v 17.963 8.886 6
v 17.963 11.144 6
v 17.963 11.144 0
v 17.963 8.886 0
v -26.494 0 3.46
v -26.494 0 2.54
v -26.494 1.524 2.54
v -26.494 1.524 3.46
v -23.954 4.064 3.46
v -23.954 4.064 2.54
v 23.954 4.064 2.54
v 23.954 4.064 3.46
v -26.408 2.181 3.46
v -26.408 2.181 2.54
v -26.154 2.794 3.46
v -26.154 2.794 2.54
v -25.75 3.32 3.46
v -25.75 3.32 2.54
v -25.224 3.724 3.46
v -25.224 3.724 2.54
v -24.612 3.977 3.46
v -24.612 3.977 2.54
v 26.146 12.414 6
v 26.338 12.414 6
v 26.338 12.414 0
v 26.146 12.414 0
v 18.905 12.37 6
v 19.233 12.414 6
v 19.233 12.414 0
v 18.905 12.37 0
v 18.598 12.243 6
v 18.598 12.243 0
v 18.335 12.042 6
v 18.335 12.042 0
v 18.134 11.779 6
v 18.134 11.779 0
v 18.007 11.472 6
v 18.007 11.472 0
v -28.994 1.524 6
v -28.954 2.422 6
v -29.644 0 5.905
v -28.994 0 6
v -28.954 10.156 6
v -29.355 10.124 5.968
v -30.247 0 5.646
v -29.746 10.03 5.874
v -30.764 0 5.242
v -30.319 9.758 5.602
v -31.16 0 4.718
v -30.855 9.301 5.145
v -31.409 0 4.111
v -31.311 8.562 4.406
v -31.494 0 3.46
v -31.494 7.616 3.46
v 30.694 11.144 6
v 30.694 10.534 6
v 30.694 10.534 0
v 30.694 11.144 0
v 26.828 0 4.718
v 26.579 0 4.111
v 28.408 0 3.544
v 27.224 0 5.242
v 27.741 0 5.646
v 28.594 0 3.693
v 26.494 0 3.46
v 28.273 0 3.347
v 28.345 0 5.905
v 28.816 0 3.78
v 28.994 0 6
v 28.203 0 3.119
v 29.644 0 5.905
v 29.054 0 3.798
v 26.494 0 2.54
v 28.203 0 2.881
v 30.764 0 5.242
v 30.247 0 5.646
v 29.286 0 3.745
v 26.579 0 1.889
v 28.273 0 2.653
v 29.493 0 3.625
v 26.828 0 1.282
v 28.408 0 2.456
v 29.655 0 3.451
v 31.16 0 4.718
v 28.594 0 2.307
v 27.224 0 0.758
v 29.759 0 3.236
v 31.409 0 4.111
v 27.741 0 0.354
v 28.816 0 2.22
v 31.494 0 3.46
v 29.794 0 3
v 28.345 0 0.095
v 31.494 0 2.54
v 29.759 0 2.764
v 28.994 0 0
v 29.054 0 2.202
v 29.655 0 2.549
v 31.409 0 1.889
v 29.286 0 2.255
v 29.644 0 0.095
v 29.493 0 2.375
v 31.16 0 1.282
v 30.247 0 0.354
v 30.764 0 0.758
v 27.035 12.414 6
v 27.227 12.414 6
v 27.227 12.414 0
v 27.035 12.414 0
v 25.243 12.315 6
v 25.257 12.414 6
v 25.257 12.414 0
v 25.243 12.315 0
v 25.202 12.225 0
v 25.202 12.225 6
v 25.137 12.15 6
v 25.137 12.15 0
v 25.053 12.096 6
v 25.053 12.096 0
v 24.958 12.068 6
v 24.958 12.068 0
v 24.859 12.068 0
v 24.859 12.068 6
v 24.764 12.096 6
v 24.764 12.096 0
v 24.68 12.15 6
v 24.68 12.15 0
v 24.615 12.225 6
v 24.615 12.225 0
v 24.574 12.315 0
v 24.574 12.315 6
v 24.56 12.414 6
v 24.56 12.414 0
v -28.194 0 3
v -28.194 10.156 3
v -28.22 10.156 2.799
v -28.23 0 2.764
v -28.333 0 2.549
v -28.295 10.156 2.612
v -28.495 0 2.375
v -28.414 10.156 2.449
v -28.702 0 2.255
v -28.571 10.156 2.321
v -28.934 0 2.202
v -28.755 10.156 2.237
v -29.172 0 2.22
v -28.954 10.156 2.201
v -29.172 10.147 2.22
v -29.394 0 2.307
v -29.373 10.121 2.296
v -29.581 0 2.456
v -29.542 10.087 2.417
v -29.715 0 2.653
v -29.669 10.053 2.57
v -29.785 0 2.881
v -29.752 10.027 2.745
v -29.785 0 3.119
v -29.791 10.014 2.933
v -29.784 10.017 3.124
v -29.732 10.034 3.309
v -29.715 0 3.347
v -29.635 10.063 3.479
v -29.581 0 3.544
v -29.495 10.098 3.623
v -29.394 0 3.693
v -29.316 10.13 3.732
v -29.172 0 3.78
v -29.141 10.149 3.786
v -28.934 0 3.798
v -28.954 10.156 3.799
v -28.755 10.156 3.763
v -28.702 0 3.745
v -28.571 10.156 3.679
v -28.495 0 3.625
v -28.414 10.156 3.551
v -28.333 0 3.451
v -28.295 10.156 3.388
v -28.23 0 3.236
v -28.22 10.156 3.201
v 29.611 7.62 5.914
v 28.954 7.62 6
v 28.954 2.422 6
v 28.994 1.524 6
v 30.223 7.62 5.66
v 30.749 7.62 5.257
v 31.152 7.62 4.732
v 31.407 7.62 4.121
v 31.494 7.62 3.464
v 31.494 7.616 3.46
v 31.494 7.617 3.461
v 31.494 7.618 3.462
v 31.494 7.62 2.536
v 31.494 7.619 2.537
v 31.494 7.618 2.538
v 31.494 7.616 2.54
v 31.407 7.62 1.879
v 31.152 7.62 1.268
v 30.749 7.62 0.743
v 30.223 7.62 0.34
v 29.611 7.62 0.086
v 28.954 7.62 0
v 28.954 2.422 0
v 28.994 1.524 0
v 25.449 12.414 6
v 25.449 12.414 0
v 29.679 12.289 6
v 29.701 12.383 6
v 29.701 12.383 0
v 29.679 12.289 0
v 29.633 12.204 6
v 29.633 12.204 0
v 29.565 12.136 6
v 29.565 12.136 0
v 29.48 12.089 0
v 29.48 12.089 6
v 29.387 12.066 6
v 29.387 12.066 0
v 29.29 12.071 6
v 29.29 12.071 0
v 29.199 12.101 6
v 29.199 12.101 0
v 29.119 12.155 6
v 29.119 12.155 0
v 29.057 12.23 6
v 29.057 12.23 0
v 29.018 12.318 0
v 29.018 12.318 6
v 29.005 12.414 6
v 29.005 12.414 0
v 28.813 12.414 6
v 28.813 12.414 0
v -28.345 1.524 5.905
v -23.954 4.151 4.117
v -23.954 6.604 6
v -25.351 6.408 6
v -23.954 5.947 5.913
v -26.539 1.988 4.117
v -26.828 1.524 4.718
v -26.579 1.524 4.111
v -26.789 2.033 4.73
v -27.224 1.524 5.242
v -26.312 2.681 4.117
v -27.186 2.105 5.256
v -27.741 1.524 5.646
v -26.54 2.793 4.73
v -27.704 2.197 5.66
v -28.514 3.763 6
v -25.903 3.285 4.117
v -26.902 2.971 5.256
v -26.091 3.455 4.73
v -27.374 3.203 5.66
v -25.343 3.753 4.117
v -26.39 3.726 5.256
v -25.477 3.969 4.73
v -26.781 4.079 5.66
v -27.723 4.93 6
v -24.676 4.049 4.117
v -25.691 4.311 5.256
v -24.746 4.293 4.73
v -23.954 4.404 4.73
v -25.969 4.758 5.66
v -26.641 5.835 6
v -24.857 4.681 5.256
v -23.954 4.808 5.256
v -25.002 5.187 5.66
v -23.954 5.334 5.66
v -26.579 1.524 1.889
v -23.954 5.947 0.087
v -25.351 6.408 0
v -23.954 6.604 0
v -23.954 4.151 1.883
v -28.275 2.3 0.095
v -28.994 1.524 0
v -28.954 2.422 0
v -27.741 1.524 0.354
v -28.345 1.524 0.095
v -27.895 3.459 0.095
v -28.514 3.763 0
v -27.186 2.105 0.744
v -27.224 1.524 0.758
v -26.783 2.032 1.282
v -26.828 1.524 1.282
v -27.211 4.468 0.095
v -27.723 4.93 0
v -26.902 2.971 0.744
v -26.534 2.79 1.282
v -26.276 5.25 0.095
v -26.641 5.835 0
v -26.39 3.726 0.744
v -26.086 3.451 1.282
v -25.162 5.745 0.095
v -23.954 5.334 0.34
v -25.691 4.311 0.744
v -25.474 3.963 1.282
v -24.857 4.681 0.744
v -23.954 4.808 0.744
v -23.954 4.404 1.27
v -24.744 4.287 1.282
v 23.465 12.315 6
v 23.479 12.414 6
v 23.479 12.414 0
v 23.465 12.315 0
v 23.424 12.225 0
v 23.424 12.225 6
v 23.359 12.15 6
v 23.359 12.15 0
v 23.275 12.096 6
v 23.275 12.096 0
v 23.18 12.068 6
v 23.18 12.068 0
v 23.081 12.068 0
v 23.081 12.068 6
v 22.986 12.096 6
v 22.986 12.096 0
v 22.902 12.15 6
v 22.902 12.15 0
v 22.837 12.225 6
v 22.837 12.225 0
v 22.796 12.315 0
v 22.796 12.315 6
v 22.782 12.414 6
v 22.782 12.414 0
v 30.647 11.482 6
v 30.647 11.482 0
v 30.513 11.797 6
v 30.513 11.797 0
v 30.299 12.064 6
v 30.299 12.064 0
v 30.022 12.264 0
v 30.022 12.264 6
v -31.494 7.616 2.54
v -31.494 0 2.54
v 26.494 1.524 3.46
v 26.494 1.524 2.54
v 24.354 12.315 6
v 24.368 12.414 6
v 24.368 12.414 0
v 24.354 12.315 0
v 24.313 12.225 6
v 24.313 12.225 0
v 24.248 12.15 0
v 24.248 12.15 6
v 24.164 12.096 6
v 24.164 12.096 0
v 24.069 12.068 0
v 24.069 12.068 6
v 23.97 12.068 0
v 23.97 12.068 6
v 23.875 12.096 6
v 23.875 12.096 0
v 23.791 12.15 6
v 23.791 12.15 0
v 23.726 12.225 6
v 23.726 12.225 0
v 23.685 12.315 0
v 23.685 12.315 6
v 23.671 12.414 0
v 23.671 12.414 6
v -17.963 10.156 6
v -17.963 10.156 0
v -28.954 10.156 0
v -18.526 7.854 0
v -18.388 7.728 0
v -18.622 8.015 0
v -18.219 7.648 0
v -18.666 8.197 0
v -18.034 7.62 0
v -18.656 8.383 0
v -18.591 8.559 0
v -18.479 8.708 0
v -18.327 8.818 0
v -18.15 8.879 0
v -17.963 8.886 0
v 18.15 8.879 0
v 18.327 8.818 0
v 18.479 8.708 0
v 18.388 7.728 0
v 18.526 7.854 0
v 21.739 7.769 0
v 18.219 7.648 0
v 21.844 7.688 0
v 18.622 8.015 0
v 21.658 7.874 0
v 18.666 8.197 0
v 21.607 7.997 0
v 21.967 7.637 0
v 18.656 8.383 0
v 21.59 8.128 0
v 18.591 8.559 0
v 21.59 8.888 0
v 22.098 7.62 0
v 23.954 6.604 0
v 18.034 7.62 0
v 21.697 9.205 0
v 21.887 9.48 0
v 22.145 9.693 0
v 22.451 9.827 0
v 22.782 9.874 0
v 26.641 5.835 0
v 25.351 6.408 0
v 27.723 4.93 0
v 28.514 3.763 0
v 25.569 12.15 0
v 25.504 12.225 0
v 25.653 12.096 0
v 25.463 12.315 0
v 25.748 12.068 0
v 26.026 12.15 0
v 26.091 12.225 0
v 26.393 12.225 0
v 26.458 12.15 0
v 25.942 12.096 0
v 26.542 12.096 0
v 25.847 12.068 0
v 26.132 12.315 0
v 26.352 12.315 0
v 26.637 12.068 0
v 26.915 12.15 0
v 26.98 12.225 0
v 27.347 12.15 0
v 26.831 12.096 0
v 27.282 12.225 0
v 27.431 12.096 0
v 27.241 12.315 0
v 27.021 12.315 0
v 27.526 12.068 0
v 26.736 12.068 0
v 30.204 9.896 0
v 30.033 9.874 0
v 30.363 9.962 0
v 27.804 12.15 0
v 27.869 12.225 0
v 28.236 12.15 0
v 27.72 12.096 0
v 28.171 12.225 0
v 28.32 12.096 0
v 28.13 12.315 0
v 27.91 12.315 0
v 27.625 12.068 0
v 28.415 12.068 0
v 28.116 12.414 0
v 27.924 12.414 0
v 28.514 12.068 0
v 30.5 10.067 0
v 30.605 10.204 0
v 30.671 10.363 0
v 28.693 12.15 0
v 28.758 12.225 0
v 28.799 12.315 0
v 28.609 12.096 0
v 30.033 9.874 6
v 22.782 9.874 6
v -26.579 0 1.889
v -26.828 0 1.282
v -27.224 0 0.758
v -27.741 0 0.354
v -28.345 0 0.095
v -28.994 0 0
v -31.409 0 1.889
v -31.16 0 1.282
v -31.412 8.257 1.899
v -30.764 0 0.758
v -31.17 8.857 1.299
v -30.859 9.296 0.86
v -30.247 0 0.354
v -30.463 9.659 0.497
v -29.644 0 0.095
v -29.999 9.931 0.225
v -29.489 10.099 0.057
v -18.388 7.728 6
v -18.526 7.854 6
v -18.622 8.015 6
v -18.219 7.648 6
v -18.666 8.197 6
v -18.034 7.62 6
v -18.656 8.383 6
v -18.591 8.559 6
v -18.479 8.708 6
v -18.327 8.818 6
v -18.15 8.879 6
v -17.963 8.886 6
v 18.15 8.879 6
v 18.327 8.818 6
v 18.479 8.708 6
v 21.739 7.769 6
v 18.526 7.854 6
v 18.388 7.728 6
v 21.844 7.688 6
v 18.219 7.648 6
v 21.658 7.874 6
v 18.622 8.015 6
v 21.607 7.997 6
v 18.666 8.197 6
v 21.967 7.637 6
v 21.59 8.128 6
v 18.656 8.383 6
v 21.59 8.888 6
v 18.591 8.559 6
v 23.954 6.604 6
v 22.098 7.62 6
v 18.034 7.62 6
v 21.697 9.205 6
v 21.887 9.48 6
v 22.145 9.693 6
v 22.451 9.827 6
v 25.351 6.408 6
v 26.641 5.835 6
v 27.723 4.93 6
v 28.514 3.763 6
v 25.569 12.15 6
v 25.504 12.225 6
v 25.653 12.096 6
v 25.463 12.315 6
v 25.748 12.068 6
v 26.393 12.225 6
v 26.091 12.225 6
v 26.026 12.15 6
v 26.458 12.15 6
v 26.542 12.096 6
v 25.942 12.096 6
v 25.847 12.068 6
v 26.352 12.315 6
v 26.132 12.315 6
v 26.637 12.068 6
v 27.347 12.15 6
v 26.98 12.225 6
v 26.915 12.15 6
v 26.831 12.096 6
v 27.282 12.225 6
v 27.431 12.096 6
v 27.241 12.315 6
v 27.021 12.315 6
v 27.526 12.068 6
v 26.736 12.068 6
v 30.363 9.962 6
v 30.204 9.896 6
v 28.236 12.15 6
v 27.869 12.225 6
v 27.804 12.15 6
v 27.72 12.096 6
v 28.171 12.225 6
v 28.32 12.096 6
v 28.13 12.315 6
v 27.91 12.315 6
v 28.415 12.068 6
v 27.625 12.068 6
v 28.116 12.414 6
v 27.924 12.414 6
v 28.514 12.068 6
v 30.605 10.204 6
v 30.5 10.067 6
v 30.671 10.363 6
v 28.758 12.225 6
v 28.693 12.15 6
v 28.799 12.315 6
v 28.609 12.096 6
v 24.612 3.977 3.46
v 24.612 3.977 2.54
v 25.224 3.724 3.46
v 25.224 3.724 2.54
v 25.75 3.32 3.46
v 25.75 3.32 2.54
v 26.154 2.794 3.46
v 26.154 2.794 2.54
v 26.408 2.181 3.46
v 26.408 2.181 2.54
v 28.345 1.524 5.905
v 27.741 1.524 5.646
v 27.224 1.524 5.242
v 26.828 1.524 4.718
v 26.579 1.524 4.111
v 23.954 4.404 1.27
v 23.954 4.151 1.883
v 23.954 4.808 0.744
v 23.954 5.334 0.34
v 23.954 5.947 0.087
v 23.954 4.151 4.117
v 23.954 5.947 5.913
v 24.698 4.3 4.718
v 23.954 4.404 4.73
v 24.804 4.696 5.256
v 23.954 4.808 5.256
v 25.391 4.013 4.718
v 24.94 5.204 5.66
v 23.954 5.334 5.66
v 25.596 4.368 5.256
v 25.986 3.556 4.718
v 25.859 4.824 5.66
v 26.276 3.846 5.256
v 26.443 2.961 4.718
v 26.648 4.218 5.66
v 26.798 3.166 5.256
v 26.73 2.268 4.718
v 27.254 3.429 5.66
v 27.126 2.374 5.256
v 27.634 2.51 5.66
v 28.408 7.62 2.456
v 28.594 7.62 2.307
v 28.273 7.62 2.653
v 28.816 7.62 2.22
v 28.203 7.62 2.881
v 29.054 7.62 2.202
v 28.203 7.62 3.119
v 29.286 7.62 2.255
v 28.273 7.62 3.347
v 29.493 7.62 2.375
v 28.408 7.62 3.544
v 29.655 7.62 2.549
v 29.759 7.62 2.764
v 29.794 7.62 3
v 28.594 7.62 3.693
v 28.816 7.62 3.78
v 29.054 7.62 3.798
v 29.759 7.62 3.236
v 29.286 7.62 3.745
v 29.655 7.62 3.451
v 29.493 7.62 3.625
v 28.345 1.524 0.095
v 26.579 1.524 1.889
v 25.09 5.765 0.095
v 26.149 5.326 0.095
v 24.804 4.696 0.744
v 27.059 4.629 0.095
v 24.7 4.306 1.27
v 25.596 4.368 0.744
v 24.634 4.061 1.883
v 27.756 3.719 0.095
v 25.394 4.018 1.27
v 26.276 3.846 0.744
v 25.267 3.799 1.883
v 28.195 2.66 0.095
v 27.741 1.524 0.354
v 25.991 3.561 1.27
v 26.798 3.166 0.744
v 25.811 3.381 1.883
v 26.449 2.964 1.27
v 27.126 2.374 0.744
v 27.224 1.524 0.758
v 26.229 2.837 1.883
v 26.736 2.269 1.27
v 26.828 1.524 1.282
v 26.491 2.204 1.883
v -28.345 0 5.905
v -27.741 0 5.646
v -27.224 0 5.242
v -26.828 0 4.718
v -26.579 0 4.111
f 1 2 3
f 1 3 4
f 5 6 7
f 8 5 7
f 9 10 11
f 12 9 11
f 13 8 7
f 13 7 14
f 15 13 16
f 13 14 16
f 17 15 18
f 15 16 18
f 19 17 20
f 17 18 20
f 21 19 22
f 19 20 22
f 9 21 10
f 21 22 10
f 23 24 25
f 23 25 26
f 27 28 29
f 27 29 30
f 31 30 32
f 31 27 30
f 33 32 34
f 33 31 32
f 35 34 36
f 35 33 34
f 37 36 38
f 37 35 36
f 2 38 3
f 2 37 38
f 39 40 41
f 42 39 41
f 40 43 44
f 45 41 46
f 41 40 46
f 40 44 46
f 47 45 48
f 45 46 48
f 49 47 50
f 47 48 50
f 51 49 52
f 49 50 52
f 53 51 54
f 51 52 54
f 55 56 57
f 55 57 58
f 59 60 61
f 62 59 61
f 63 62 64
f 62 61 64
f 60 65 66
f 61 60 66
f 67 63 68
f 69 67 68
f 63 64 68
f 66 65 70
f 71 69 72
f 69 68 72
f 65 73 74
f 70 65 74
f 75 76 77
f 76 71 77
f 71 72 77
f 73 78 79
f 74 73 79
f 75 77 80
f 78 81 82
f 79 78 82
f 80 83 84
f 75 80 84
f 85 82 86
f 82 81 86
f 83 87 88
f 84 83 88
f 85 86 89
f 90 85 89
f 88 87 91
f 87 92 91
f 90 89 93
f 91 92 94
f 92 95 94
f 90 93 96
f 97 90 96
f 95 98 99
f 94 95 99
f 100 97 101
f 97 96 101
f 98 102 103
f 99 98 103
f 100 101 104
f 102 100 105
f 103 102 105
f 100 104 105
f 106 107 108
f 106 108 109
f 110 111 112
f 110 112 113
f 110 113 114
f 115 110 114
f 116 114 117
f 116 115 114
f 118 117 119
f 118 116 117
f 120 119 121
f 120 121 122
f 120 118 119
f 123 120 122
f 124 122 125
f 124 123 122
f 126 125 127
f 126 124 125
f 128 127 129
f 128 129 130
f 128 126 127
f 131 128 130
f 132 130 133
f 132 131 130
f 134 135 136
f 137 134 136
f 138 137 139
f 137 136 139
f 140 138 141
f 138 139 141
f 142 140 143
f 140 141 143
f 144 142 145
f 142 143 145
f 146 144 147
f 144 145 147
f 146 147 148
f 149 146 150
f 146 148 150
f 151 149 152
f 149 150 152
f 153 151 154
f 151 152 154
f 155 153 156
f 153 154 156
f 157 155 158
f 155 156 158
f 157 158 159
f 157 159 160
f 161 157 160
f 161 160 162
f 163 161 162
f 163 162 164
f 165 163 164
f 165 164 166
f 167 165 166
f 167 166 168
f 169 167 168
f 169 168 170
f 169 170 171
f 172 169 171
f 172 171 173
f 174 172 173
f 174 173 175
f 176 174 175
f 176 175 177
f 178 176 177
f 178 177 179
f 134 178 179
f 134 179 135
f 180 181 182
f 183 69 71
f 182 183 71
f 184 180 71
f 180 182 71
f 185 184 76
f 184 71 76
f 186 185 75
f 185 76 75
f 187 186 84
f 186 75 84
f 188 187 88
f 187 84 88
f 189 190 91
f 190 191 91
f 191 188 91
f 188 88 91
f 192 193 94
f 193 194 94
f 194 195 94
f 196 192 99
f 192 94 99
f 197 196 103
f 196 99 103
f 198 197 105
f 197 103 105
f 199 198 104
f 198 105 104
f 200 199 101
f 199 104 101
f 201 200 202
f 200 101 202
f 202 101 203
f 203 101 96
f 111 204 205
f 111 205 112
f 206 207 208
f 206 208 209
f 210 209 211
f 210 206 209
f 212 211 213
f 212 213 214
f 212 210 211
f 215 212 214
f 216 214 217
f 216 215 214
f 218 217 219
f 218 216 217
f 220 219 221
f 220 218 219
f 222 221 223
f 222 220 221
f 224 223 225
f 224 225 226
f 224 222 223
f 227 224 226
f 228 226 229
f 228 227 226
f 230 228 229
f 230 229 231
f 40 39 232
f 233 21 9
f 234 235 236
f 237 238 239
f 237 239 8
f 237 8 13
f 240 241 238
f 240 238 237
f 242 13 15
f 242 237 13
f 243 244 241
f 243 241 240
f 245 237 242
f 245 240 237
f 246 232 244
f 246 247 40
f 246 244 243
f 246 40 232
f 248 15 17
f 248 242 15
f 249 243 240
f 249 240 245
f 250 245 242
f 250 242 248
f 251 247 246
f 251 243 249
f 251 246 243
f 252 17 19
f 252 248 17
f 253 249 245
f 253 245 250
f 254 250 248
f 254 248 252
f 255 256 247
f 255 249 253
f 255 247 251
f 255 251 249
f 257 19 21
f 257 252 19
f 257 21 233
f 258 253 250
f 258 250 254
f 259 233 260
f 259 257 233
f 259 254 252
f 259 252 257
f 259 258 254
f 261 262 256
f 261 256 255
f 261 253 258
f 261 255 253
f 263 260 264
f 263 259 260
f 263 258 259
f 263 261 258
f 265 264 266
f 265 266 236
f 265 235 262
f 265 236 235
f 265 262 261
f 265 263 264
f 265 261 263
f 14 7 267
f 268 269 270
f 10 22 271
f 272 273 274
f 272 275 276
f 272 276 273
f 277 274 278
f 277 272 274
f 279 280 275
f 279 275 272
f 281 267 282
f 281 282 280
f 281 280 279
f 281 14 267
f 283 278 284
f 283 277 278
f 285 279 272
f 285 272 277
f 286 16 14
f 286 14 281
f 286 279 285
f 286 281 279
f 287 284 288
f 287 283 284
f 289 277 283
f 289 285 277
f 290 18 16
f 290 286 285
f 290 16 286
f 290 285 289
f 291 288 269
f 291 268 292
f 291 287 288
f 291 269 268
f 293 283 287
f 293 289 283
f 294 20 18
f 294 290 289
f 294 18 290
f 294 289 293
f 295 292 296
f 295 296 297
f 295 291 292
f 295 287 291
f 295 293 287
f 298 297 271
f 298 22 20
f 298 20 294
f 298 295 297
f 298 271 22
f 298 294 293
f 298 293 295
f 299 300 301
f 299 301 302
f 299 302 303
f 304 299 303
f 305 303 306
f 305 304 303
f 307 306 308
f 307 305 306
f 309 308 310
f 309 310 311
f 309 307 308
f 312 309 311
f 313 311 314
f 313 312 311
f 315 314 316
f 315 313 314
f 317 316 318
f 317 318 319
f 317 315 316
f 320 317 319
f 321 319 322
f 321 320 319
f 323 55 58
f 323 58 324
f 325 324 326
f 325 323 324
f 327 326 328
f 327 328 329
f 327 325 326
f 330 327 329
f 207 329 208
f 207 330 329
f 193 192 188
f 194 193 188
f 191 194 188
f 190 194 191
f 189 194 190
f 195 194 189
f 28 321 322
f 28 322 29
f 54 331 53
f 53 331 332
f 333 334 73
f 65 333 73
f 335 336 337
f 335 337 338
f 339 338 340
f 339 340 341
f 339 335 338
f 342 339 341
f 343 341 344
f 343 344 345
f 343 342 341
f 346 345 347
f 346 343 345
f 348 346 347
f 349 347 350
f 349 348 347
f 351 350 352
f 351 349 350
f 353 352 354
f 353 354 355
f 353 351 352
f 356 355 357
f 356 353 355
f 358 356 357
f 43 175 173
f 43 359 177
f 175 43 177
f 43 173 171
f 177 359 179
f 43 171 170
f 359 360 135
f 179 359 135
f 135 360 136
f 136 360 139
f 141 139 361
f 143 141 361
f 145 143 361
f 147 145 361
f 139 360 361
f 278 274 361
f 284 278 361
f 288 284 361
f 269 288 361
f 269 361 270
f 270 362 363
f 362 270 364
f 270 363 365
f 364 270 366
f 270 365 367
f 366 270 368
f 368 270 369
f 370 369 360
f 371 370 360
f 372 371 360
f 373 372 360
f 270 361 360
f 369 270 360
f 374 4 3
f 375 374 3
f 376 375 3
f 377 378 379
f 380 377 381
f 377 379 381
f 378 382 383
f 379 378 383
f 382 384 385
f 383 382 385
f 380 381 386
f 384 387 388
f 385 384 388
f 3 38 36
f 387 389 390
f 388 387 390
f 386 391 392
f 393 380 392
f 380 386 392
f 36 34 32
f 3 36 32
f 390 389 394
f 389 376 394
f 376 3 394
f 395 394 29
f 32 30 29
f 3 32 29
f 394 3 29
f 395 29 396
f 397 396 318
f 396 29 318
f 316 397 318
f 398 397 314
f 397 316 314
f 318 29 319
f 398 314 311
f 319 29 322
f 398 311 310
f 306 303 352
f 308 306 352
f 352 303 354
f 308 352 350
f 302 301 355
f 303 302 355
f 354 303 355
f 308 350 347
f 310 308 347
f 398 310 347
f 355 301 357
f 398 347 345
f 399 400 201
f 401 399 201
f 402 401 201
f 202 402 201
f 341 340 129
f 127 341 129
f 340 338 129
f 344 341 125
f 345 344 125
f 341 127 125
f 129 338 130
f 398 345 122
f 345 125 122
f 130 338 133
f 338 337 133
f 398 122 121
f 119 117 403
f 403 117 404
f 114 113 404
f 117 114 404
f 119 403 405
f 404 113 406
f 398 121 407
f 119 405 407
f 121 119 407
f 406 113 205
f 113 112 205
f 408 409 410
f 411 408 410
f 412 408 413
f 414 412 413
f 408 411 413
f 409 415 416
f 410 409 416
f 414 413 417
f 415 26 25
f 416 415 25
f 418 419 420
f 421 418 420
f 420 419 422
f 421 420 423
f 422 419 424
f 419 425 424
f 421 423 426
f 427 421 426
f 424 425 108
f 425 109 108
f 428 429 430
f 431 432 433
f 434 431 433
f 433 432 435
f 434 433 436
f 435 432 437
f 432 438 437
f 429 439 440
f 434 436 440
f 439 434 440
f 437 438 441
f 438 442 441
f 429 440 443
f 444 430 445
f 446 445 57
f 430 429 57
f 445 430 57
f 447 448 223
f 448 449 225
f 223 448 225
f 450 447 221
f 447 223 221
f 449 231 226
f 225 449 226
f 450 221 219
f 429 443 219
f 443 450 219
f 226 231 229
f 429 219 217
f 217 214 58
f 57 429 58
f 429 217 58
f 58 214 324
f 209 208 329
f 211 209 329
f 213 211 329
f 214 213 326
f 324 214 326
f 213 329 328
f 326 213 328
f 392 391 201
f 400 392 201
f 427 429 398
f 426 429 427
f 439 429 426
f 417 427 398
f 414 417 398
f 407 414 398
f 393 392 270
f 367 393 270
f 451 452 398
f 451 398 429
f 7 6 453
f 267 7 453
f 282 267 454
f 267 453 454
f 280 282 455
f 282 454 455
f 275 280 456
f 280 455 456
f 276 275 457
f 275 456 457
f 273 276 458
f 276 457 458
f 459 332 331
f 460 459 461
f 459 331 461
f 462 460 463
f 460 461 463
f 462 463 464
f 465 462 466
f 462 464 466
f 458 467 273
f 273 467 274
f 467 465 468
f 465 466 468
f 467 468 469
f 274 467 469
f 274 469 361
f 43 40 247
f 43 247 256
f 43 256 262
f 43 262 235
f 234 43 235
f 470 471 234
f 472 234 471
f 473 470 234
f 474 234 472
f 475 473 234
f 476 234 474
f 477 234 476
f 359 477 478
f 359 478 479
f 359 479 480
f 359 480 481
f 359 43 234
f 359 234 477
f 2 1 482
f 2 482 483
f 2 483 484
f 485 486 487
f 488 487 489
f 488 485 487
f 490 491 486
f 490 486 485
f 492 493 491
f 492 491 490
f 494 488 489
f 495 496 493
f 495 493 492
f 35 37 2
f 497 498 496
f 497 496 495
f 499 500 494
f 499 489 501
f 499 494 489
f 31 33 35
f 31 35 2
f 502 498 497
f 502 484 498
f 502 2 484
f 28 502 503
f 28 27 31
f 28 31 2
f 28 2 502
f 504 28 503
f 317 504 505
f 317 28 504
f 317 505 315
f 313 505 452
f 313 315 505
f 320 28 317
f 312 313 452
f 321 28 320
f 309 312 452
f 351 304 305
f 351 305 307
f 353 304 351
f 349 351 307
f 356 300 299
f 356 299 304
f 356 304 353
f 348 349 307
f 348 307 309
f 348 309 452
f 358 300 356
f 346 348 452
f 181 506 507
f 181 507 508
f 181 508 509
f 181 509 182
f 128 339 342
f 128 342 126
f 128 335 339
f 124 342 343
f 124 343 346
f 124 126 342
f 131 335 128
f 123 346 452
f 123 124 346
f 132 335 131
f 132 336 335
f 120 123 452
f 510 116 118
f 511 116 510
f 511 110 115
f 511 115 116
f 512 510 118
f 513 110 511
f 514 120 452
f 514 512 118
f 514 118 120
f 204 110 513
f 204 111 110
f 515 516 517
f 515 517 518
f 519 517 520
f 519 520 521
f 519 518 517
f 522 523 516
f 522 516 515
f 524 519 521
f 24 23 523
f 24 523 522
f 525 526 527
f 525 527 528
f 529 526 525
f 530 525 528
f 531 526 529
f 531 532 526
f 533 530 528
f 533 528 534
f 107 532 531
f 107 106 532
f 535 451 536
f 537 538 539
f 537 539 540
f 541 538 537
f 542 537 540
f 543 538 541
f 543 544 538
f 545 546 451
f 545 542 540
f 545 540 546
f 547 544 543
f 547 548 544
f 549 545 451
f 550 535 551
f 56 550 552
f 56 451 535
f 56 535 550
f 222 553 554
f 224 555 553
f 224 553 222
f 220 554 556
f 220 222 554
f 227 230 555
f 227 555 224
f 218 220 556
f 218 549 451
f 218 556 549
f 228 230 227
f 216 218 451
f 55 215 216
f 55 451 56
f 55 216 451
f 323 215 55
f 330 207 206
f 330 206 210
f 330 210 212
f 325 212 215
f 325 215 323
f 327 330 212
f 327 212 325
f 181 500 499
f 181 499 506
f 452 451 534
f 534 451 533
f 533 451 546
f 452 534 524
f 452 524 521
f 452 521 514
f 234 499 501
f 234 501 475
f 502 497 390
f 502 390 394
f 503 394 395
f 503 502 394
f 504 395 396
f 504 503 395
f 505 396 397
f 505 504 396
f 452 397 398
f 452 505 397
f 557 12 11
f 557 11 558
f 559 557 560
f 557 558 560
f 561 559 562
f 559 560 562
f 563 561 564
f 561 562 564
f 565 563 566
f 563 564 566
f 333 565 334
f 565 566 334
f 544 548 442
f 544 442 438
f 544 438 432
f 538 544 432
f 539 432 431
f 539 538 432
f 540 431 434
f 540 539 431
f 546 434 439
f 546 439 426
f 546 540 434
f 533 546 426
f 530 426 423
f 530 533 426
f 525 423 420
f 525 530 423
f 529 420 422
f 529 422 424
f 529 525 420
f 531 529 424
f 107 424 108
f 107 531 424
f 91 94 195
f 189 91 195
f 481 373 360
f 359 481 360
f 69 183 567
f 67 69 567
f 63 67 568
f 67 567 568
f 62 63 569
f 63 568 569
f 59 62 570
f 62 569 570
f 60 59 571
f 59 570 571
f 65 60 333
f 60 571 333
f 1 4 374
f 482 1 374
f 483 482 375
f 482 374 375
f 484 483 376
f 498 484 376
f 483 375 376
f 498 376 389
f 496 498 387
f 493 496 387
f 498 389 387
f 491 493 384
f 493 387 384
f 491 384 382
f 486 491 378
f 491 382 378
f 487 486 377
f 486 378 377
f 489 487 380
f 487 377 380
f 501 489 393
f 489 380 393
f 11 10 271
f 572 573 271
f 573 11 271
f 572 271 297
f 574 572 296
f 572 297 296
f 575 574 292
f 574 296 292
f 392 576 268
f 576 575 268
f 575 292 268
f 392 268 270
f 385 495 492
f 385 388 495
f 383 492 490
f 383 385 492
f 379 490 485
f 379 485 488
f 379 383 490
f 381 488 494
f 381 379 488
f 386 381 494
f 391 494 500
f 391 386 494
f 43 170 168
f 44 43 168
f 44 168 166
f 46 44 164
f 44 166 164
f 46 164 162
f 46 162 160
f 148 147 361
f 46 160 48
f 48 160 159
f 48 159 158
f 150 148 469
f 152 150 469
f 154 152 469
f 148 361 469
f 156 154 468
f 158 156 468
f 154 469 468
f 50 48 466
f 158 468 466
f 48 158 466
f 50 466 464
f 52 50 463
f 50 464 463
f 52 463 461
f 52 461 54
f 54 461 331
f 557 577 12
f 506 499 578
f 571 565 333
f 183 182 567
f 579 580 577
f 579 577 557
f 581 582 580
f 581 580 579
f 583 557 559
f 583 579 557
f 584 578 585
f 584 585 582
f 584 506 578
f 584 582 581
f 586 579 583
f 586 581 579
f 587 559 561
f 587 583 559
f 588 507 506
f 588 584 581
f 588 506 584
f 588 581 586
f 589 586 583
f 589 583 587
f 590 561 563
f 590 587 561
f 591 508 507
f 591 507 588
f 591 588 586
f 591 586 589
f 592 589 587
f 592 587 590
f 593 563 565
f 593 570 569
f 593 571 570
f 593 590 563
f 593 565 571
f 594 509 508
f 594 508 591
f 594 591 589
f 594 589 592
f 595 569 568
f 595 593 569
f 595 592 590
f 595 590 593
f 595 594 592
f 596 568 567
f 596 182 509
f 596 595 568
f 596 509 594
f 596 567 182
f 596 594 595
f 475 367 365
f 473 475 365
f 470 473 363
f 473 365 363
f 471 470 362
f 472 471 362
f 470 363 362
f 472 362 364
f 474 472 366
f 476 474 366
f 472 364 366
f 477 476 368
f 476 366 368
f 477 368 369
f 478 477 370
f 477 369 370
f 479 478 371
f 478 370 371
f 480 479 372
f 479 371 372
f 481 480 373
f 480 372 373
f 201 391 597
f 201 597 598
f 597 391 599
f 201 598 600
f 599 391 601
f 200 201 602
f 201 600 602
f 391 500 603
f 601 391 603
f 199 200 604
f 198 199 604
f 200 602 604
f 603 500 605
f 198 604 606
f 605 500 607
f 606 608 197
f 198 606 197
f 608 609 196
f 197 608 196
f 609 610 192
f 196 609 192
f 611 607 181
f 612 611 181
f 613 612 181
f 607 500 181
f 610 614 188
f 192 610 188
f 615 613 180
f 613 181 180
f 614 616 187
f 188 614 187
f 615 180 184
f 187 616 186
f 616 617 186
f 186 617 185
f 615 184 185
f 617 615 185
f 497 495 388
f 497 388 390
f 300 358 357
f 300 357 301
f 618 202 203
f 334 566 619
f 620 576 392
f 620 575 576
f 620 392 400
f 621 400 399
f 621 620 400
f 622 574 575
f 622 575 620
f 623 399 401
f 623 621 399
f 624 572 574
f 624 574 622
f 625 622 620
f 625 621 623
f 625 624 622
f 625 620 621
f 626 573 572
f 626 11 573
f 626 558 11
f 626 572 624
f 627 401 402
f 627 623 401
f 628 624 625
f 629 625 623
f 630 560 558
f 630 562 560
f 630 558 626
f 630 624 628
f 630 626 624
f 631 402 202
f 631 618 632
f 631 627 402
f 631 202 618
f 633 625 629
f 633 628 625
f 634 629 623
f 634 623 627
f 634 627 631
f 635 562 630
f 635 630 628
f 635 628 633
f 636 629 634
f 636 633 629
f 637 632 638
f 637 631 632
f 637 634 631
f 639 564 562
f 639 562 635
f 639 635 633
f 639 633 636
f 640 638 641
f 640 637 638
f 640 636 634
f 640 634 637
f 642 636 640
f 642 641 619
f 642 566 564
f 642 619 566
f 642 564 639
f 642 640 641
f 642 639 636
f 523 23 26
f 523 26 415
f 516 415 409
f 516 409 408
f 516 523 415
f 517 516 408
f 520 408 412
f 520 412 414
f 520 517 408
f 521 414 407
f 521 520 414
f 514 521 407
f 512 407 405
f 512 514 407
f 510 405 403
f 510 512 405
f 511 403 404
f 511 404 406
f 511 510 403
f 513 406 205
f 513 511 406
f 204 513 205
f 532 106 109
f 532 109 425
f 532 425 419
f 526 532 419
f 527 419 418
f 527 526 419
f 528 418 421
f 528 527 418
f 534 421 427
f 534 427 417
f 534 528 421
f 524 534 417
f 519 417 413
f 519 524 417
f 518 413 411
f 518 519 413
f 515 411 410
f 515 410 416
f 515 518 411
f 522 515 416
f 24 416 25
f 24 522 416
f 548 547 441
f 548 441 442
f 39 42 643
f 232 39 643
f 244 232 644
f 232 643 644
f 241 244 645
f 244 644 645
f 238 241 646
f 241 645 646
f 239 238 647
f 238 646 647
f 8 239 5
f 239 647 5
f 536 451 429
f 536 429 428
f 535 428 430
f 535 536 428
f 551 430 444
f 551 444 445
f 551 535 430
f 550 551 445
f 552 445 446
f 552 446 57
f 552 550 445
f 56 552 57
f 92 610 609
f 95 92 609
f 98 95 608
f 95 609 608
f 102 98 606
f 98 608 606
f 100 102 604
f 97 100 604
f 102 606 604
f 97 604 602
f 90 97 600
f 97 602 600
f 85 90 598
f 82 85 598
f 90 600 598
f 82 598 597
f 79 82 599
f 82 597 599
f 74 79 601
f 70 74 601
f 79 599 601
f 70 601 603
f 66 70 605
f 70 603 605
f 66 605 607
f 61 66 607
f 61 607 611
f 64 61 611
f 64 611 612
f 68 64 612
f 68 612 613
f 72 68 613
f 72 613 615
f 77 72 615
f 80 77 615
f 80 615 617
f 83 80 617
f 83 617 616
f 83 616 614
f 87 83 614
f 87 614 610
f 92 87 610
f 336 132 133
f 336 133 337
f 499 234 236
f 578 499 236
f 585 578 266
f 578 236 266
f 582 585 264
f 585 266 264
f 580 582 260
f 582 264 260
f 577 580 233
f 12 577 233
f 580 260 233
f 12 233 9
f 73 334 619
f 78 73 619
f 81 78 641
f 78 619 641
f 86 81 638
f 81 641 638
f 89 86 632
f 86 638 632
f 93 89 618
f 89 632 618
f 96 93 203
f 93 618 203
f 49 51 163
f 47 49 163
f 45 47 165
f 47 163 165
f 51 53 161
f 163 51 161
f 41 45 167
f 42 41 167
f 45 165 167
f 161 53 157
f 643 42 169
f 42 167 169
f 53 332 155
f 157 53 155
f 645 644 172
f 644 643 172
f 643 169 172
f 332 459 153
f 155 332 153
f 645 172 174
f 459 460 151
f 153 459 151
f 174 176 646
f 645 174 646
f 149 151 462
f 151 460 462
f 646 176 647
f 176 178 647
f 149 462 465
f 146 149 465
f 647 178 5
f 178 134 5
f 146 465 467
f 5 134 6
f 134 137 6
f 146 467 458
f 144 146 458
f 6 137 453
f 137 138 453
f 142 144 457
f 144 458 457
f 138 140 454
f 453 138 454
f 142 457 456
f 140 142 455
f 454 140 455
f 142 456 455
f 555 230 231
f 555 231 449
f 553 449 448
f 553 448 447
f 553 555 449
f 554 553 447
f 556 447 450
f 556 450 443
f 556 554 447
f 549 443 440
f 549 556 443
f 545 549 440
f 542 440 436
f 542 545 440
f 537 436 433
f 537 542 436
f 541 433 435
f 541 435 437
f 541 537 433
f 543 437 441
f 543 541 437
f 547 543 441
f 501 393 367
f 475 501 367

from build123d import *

# Parameters (mm, degrees)
BOSS_EXTRUDE1_DEPTH   = 6
M2X0_4_TAPPED_HOLE1_D = 1.6
FILLET1_R             = 2.54
SKETCH4_W             = 9.9041
SKETCH4_H             = 2.536063356
CUT_EXTRUDE1_DEPTH    = 34.630699773
BOSS_EXTRUDE2_DEPTH   = 6
FILLET2_R             = 0.508


with BuildPart() as part:
    # Sketch1 → Boss-Extrude1 (new body)
    with BuildSketch(Plane.XY):
        with BuildLine():
            Line((-31.4941, 0), (-26.4941, 0))
            Line((-26.4941, 0), (-26.4941, 1.524))
            ThreePointArc((-26.4941, 1.524), (-25.750151224, 3.320051224), (-23.9541, 4.064))
            Line((-23.9541, 4.064), (23.9541, 4.064))
            ThreePointArc((23.9541, 4.064), (25.750151224, 3.320051224), (26.4941, 1.524))
            Line((26.4941, 1.524), (26.4941, 0))
            Line((26.4941, 0), (31.4941, 0))
            Line((31.4941, 0), (31.4941, 10.156063356))
            Line((31.4941, 10.156063356), (17.963402264, 10.156063356))
            Line((17.963402264, 10.156063356), (17.963402264, 8.886063356))
            ThreePointArc((17.963402264, 8.886063356), (18.668015075, 8.290353704), (18.034, 7.62))
            Line((18.034, 7.62), (-18.034, 7.62))
            ThreePointArc((-18.034, 7.62), (-18.668015075, 8.290353704), (-17.963402264, 8.886063356))
            Line((-17.963402264, 8.886063356), (-17.963402264, 10.156063356))
            Line((-17.963402264, 10.156063356), (-31.4941, 10.156063356))
            Line((-31.4941, 10.156063356), (-31.4941, 0))
        make_face()
    extrude(amount=BOSS_EXTRUDE1_DEPTH)

    # M2x0.4 Tapped Hole1 (through all)
    with Locations(Plane(origin=(0, 0, 0), x_dir=(-1, 0, 0), z_dir=(0, -1, 0))):
        with Locations((28.9941, -3), (-28.9941, -3)):
            Hole(M2X0_4_TAPPED_HOLE1_D / 2)

    # Fillet1
    # the kernel refuses this fillet: 2.54 mm, written as the material it takes off along each edge
    with BuildSketch(Plane(origin=(-26.4941, -6.35, 0), x_dir=(-1, 0, 0), z_dir=(0, 1, 0)), Plane(origin=(26.4941, 1.524, 0), x_dir=(1, 0, 0), z_dir=(0, -1, 0))) as fillet1_piece_1:
        with BuildLine():
            CenterArc((FILLET1_R, FILLET1_R), FILLET1_R, 180, 90)
            Line((0, FILLET1_R), (0, 0))
            Line((0, 0), (FILLET1_R, 0))
        make_face()
    extrude(amount=7.874, mode=Mode.SUBTRACT)
    with BuildSketch(Plane(origin=(-23.9541, 1.524, 0), x_dir=(-1, 0, 0), z_dir=(0, -1, 0))) as fillet1_piece_2:
        with BuildLine():
            CenterArc((2.54 + FILLET1_R, -FILLET1_R), FILLET1_R, 90, 90)
            Line((2.54, -FILLET1_R), (2.54, 0))
            Line((2.54, 0), (2.54 + FILLET1_R, 0))
        make_face()
    revolve(axis=Axis((-23.9541, 1.524, 0), (0, 0, -1)), revolution_arc=90, mode=Mode.SUBTRACT)
    with BuildSketch(Plane(origin=(23.9541, 1.524, 0), x_dir=(0, 1, 0), z_dir=(-1, 0, 0))) as fillet1_piece_3:
        with BuildLine():
            CenterArc((2.54 + FILLET1_R, -FILLET1_R), FILLET1_R, 90, 90)
            Line((2.54, -FILLET1_R), (2.54, 0))
            Line((2.54, 0), (2.54 + FILLET1_R, 0))
        make_face()
    revolve(axis=Axis((23.9541, 1.524, 0), (0, 0, -1)), revolution_arc=90, mode=Mode.SUBTRACT)
    with BuildSketch(Plane(origin=(-26.4941, -6.35, 6), x_dir=(-1, 0, 0), z_dir=(0, 1, 0)), Plane(origin=(26.4941, 1.524, 6), x_dir=(1, 0, 0), z_dir=(0, -1, 0))) as fillet1_piece_4:
        with BuildLine():
            CenterArc((FILLET1_R, -FILLET1_R), FILLET1_R, 90, 90)
            Line((0, -FILLET1_R), (0, 0))
            Line((0, 0), (FILLET1_R, 0))
        make_face()
    extrude(amount=7.874, mode=Mode.SUBTRACT)
    with BuildSketch(Plane(origin=(-23.9541, 1.524, 6), x_dir=(-1, 0, 0), z_dir=(0, -1, 0))) as fillet1_piece_5:
        with BuildLine():
            CenterArc((2.54 + FILLET1_R, FILLET1_R), FILLET1_R, 180, 90)
            Line((2.54, FILLET1_R), (2.54, 0))
            Line((2.54, 0), (2.54 + FILLET1_R, 0))
        make_face()
    revolve(axis=Axis((-23.9541, 1.524, 6), (0, 0, -1)), revolution_arc=90, mode=Mode.SUBTRACT)
    with BuildSketch(Plane(origin=(-23.9541, 4.064, 6), x_dir=(0, 1, 0), z_dir=(1, 0, 0))) as fillet1_piece_6:
        with BuildLine():
            CenterArc((FILLET1_R, -FILLET1_R), FILLET1_R, 90, 90)
            Line((0, -FILLET1_R), (0, 0))
            Line((0, 0), (FILLET1_R, 0))
        make_face()
    extrude(amount=47.9082, mode=Mode.SUBTRACT)
    with BuildSketch(Plane(origin=(23.9541, 1.524, 6), x_dir=(0, 1, 0), z_dir=(-1, 0, 0))) as fillet1_piece_7:
        with BuildLine():
            CenterArc((2.54 + FILLET1_R, FILLET1_R), FILLET1_R, 180, 90)
            Line((2.54, FILLET1_R), (2.54, 0))
            Line((2.54, 0), (2.54 + FILLET1_R, 0))
        make_face()
    revolve(axis=Axis((23.9541, 1.524, 6), (0, 0, -1)), revolution_arc=90, mode=Mode.SUBTRACT)
    with BuildSketch(Plane(origin=(-31.4941, 16.506063356, 0), x_dir=(1, 0, 0), z_dir=(0, -1, 0)), Plane(origin=(31.4941, -6.35, 0), x_dir=(-1, 0, 0), z_dir=(0, 1, 0))) as fillet1_piece_8:
        with BuildLine():
            CenterArc((FILLET1_R, FILLET1_R), FILLET1_R, 180, 90)
            Line((0, FILLET1_R), (0, 0))
            Line((0, 0), (FILLET1_R, 0))
        make_face()
    extrude(amount=22.856063356, mode=Mode.SUBTRACT)
    with BuildSketch(Plane(origin=(-31.4941, 16.506063356, 6), x_dir=(1, 0, 0), z_dir=(0, -1, 0)), Plane(origin=(31.4941, -6.35, 6), x_dir=(-1, 0, 0), z_dir=(0, 1, 0))) as fillet1_piece_9:
        with BuildLine():
            CenterArc((FILLET1_R, -FILLET1_R), FILLET1_R, 90, 90)
            Line((0, -FILLET1_R), (0, 0))
            Line((0, 0), (FILLET1_R, 0))
        make_face()
    extrude(amount=22.856063356, mode=Mode.SUBTRACT)
    with BuildSketch(Plane(origin=(-23.9541, 4.064, 0), x_dir=(0, 1, 0), z_dir=(1, 0, 0))) as fillet1_piece_10:
        with BuildLine():
            CenterArc((FILLET1_R, FILLET1_R), FILLET1_R, 180, 90)
            Line((0, FILLET1_R), (0, 0))
            Line((0, 0), (FILLET1_R, 0))
        make_face()
    extrude(amount=47.9082, mode=Mode.SUBTRACT)
    with BuildSketch(Plane(origin=(31.4941, 10.156063356, -6.35), x_dir=(0, -1, 0), z_dir=(0, 0, 1)), Plane(origin=(-31.4941, 10.156063356, -6.35), x_dir=(1, 0, 0), z_dir=(0, 0, 1))) as fillet1_piece_11:
        with BuildLine():
            CenterArc((FILLET1_R, -FILLET1_R), FILLET1_R, 90, 90)
            Line((0, -FILLET1_R), (0, 0))
            Line((0, 0), (FILLET1_R, 0))
        make_face()
    extrude(amount=18.7, mode=Mode.SUBTRACT)

    # Sketch4 → Cut-Extrude1 (cut, through all)
    with BuildSketch(Plane.XY.offset(6)):
        with Locations((26.54205, 8.888031678)):
            Rectangle(SKETCH4_W, SKETCH4_H)
    extrude(amount=-CUT_EXTRUDE1_DEPTH, mode=Mode.SUBTRACT)

    # Sketch5 → Boss-Extrude2 (add)
    with BuildSketch(Plane.XY.offset(6)):
        with BuildLine():
            Line((22.781680466, 9.873540862), (30.033107734, 9.873540862))
            ThreePointArc((30.033107734, 9.873540862), (30.500081052, 10.066967543), (30.693507734, 10.533940862))
            Line((30.693507734, 10.533940862), (30.693507734, 11.143540862))
            ThreePointArc((30.693507734, 11.143540862), (30.414801602, 11.937415201), (29.701009362, 12.382852302))
            ThreePointArc((29.701009362, 12.382852302), (29.338161991, 12.065038452), (29.004680466, 12.413540862))
            Line((29.004680466, 12.413540862), (28.813361866, 12.413540862))
            ThreePointArc((28.813361866, 12.413540862), (28.464521166, 12.064700162), (28.115680466, 12.413540862))
            Line((28.115680466, 12.413540862), (27.924361866, 12.413540862))
            ThreePointArc((27.924361866, 12.413540862), (27.575521166, 12.064700162), (27.226680466, 12.413540862))
            Line((27.226680466, 12.413540862), (27.035361866, 12.413540862))
            ThreePointArc((27.035361866, 12.413540862), (26.686521166, 12.064700162), (26.337680466, 12.413540862))
            Line((26.337680466, 12.413540862), (26.146361866, 12.413540862))
            ThreePointArc((26.146361866, 12.413540862), (25.797521166, 12.064700162), (25.448680466, 12.413540862))
            Line((25.448680466, 12.413540862), (25.257361866, 12.413540862))
            ThreePointArc((25.257361866, 12.413540862), (24.908521166, 12.064700162), (24.559680466, 12.413540862))
            Line((24.559680466, 12.413540862), (24.368361866, 12.413540862))
            ThreePointArc((24.368361866, 12.413540862), (24.019521166, 12.064700162), (23.670680466, 12.413540862))
            Line((23.670680466, 12.413540862), (23.479361866, 12.413540862))
            ThreePointArc((23.479361866, 12.413540862), (23.130521166, 12.064700162), (22.781680466, 12.413540862))
            Line((22.781680466, 12.413540862), (19.233402264, 12.413540862))
            ThreePointArc((19.233402264, 12.413540862), (18.335376652, 12.041566474), (17.963402264, 11.143540862))
            Line((17.963402264, 11.143540862), (17.963402264, 10.156063356))
            Line((17.963402264, 10.156063356), (21.59, 10.156063356))
            Line((21.59, 10.156063356), (21.59, 8.888031678))
            ThreePointArc((21.59, 8.888031678), (22.008484067, 9.595245842), (22.781680466, 9.873540862))
        make_face()
    extrude(amount=-BOSS_EXTRUDE2_DEPTH)

    # Fillet2
    fillet2_edges = [part.edges().sort_by_distance(p)[0] for p in [
        (21.59, 7.62, 3),
    ]]
    fillet(fillet2_edges, radius=FILLET2_R)


solid = part.part
